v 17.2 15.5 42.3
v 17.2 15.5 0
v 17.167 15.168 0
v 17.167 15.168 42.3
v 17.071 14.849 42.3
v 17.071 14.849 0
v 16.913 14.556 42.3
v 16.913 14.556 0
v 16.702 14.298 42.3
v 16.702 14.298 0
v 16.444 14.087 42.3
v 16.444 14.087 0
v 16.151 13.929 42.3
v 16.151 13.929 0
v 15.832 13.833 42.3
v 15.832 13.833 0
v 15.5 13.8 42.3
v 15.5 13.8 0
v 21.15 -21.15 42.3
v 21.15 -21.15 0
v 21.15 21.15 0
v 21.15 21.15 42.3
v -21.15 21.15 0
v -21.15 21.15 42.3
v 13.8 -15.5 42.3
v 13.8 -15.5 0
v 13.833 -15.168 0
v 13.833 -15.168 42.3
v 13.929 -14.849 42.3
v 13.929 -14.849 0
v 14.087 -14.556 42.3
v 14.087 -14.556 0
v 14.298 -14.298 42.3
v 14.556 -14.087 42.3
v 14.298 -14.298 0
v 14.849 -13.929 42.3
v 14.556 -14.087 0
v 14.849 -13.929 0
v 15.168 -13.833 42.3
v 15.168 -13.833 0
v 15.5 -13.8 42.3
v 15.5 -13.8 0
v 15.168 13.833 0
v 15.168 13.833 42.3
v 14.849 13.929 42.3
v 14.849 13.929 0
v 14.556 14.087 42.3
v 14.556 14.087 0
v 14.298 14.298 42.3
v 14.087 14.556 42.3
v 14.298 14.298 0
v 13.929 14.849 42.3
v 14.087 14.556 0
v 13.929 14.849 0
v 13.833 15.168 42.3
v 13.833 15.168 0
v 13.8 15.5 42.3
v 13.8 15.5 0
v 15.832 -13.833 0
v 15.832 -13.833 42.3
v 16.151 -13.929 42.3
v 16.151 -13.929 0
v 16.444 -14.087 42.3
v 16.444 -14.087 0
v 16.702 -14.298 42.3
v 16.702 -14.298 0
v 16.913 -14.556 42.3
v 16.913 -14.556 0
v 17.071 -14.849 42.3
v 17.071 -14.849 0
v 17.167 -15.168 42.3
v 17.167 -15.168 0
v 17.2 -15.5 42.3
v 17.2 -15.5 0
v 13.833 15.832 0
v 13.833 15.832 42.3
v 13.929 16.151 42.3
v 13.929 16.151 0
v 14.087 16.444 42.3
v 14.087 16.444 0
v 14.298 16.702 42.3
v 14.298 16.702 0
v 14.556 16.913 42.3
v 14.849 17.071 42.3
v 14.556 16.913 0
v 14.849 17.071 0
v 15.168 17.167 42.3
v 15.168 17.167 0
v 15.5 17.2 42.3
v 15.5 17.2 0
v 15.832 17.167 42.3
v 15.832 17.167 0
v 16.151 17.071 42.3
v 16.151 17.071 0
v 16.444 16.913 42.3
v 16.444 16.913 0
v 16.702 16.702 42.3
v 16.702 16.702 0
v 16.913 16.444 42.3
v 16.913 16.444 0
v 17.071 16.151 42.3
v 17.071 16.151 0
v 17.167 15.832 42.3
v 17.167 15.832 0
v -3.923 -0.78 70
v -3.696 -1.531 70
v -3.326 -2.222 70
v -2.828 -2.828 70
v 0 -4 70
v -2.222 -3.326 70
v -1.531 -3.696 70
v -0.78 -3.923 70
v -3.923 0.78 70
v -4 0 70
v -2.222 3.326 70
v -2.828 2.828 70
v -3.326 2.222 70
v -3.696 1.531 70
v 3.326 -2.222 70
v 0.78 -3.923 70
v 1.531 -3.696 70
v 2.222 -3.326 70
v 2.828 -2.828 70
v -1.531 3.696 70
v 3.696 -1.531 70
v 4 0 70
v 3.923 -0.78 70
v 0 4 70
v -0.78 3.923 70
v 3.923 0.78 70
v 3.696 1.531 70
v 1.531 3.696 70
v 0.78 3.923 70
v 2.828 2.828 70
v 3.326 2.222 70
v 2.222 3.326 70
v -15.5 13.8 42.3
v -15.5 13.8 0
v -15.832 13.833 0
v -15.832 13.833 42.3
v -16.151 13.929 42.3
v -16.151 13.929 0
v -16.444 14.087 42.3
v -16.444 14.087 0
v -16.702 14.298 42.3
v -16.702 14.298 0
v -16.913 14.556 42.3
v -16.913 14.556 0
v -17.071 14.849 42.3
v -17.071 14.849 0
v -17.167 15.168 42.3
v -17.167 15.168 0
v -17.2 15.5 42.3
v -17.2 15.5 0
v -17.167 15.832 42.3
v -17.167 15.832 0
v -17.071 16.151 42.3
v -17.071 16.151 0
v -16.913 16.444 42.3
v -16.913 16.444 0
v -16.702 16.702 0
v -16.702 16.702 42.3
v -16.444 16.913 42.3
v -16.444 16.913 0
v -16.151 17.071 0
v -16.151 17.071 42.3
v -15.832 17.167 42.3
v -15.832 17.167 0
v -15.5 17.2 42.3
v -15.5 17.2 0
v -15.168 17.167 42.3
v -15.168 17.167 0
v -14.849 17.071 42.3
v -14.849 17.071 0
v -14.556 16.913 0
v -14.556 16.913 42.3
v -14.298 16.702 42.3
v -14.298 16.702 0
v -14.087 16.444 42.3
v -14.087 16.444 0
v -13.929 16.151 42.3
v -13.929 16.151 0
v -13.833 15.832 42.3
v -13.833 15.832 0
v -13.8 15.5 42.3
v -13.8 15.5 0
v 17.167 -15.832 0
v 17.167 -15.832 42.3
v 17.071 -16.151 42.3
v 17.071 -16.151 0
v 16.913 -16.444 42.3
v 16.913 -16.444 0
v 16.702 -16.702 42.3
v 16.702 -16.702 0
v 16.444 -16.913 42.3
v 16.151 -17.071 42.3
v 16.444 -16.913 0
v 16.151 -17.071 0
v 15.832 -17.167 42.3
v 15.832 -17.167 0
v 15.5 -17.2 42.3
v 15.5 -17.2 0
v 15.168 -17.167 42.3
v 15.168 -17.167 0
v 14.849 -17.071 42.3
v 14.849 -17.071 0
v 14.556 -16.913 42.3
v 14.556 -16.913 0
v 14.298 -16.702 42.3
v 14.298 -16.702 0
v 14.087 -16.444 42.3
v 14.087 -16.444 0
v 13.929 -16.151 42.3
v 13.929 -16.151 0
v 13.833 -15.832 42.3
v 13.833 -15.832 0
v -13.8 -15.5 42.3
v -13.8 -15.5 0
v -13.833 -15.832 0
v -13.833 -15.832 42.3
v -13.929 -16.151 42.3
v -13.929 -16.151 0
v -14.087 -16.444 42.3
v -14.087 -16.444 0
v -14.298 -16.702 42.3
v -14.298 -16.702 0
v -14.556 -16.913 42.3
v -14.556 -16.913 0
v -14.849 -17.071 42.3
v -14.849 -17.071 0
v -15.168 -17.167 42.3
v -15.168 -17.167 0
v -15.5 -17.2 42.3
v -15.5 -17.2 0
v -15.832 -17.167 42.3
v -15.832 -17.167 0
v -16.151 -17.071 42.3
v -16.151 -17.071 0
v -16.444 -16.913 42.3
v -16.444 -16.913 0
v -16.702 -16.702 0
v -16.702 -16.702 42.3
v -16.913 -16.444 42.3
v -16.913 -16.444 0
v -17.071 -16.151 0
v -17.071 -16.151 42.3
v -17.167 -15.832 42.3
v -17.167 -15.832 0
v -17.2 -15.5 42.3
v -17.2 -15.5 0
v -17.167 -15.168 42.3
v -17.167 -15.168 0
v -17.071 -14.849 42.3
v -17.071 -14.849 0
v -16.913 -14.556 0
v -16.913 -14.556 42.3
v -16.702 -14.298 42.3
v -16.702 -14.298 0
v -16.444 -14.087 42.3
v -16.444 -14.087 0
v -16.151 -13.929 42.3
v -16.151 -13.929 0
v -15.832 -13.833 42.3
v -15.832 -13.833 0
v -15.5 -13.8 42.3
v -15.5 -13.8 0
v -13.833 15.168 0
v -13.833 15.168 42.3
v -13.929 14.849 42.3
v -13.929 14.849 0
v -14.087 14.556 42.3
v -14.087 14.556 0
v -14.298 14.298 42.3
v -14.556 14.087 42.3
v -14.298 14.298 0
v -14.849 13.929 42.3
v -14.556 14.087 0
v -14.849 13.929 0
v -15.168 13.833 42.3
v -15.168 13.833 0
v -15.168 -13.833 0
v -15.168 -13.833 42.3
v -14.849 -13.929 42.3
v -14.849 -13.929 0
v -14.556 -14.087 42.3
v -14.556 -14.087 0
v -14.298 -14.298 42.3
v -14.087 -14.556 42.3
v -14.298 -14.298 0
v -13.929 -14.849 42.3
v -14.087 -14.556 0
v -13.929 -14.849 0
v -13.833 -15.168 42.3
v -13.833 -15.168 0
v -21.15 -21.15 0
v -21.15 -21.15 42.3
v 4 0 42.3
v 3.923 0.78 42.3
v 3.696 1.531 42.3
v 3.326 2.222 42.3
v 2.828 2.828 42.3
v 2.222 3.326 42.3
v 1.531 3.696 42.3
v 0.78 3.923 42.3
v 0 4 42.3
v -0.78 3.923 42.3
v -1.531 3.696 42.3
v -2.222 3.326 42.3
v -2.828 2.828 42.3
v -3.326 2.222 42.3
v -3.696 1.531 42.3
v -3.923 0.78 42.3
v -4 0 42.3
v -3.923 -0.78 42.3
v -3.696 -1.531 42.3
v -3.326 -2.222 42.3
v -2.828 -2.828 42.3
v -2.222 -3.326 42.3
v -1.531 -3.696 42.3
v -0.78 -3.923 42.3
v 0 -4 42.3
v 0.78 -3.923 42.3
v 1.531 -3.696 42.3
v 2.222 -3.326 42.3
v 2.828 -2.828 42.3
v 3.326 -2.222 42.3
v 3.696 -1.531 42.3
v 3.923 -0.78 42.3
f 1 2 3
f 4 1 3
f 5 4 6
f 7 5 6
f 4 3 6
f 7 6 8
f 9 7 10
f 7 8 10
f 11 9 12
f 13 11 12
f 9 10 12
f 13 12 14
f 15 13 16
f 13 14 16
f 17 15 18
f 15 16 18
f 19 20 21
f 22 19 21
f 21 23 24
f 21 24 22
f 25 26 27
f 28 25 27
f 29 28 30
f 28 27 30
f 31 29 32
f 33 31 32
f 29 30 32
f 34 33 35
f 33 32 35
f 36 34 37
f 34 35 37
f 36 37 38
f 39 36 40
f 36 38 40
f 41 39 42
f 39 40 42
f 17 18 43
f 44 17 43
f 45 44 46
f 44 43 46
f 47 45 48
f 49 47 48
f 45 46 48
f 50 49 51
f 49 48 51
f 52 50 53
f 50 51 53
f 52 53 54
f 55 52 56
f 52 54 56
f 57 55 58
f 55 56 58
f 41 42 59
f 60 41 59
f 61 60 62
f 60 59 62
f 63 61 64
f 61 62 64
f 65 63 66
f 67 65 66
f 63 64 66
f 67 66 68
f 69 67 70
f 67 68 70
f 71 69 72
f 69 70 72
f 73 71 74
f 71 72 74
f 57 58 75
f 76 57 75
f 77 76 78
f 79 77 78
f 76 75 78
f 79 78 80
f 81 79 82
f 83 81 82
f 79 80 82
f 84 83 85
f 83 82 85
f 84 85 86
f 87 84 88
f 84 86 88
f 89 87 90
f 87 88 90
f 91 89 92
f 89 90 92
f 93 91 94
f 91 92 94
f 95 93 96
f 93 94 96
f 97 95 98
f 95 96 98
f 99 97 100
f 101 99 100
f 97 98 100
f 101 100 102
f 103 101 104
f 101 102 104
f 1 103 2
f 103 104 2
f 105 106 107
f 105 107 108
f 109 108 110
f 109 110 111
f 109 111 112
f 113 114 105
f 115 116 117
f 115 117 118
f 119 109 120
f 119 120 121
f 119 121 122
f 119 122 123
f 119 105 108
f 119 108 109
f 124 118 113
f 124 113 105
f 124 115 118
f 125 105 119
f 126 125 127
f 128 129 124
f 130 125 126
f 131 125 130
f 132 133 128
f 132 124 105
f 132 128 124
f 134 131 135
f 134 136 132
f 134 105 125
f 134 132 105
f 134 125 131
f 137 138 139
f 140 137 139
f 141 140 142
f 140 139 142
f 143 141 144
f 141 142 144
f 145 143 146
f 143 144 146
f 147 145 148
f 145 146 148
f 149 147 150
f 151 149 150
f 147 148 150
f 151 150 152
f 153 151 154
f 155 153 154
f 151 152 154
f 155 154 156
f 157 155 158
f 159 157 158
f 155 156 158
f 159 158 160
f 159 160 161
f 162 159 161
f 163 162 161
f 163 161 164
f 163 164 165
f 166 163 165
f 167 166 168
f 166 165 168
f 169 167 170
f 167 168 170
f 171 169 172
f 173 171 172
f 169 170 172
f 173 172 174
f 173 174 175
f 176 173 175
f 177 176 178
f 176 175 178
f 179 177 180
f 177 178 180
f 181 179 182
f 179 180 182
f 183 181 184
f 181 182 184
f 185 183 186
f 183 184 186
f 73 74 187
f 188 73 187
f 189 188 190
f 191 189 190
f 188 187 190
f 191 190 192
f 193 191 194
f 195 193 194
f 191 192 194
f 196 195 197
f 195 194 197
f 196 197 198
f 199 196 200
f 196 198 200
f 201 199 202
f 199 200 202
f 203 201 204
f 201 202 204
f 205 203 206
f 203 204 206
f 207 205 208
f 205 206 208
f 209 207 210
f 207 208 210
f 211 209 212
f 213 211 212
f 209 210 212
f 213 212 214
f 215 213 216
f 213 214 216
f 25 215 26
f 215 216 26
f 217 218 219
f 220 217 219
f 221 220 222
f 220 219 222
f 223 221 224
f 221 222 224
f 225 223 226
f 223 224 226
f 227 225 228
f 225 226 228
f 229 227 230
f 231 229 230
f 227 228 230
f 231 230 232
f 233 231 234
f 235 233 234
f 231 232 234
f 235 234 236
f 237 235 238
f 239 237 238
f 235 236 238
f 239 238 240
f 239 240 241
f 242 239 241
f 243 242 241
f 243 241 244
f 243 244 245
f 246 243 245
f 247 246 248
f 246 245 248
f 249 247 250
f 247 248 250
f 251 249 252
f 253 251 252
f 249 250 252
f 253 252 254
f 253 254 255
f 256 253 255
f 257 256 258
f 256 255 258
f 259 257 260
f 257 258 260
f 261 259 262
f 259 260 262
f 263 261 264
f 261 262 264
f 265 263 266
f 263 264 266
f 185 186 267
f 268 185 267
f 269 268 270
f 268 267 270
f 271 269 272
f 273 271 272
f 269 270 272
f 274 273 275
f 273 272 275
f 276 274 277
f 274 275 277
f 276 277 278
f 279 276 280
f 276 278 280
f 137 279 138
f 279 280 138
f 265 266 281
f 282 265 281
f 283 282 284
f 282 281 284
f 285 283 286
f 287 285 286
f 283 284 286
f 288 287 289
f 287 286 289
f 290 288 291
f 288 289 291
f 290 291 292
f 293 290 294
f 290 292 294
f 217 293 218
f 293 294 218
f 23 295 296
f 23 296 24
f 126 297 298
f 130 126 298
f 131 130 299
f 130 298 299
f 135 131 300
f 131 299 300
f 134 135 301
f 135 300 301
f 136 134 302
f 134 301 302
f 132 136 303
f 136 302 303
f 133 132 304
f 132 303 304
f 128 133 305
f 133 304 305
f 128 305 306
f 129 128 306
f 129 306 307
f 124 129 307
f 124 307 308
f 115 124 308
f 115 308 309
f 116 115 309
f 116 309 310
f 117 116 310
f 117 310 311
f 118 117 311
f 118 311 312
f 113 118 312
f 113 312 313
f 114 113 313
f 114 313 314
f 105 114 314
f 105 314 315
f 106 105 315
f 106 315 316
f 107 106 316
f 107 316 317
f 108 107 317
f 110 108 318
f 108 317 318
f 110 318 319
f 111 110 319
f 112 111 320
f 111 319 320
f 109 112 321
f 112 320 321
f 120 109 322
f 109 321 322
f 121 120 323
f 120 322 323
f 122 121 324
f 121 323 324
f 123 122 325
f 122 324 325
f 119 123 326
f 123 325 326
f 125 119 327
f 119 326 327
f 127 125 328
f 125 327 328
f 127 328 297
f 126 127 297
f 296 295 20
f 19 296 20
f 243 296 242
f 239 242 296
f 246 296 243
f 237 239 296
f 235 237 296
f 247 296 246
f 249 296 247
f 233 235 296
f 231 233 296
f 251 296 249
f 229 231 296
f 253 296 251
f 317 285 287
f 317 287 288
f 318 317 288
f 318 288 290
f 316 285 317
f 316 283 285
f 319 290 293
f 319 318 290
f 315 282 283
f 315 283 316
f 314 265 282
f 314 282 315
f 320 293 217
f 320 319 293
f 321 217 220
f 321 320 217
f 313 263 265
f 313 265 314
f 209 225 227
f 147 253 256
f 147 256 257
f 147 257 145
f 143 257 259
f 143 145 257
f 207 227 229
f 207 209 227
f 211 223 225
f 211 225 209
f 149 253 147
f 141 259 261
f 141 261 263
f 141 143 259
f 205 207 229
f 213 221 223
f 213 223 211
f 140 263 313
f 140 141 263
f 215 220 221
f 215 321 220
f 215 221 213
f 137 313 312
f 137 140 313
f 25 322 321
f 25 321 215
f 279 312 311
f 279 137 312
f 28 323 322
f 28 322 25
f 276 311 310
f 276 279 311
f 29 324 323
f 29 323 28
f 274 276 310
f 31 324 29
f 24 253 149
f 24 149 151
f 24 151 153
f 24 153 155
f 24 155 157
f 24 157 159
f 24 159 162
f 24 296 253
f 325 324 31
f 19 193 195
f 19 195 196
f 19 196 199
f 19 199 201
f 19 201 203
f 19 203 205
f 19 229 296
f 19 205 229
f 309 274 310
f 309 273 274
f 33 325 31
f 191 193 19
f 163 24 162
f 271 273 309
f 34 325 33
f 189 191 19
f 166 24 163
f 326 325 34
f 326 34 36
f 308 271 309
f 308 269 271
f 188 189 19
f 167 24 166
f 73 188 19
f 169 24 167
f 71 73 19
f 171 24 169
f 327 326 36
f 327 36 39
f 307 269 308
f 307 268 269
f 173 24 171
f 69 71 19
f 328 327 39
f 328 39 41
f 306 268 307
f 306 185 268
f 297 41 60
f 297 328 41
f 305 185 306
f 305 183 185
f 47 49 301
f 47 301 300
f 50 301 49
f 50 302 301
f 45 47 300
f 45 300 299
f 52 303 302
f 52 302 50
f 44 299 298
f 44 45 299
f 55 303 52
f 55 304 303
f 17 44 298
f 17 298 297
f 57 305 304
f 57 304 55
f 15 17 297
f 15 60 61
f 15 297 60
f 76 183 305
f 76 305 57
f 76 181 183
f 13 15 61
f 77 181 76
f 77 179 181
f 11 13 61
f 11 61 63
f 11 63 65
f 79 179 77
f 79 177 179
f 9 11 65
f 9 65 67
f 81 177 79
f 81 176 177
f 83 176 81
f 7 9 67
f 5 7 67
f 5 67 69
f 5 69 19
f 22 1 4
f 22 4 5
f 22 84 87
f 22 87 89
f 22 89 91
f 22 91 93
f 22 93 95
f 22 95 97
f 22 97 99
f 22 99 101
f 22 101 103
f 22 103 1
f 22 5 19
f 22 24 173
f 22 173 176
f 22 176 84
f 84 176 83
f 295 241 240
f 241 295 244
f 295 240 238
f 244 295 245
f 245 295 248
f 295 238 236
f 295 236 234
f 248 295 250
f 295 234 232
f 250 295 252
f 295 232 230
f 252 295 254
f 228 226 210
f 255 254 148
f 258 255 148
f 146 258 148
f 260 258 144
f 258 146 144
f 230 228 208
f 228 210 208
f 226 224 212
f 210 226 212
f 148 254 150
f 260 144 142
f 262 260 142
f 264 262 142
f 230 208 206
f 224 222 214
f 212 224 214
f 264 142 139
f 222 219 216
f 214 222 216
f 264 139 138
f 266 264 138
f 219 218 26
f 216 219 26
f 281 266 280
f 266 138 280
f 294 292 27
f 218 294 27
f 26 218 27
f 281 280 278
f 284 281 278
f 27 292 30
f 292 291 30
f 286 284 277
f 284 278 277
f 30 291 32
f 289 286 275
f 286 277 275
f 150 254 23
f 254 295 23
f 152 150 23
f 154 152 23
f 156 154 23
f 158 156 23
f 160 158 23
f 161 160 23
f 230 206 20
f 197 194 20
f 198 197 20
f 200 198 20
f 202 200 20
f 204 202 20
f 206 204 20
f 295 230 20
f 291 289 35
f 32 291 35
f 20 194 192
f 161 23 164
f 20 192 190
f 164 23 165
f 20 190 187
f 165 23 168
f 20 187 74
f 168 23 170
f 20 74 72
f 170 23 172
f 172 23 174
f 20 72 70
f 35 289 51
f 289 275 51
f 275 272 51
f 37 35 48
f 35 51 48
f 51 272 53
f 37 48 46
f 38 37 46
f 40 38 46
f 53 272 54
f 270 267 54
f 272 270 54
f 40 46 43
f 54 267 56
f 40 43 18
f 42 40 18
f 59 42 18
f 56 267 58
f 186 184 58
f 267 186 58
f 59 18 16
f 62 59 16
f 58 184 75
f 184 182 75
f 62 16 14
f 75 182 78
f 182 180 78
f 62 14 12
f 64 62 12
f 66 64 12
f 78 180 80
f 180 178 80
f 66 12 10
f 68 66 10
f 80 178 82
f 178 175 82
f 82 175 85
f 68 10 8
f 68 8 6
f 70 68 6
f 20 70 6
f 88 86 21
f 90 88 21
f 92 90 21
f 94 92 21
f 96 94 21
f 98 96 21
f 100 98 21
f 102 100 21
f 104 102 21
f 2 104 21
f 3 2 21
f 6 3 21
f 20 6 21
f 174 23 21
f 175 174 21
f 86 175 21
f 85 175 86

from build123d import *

# Parameters (mm, degrees)
F0_W     = 42.3
F0_H     = 42.3
F0_R     = 4
F1_DEPTH = 42.3
F2_DEPTH = 70


with BuildPart() as f1:
    # F0 (on Top) → F1 (new body)
    with BuildSketch(Plane.XY):
        Rectangle(F0_W, F0_H)
        with BuildLine():
            ThreePointArc((-15.5, 13.8), (-16.702082, 16.702082), (-13.8, 15.5))
            Line((-13.8, 15.5), (13.8, 15.5))
            ThreePointArc((13.8, 15.5), (15.5, 17.2), (17.2, 15.5))
            ThreePointArc((17.2, 15.5), (16.702082, 14.297918), (15.5, 13.8))
            Line((15.5, 13.8), (15.5, -13.8))
            ThreePointArc((15.5, -13.8), (16.702082, -14.297918), (17.2, -15.5))
            ThreePointArc((17.2, -15.5), (15.5, -17.2), (13.8, -15.5))
            Line((13.8, -15.5), (-13.8, -15.5))
            ThreePointArc((-13.8, -15.5), (-16.702082, -16.702082), (-15.5, -13.8))
            Line((-15.5, -13.8), (-15.5, 13.8))
        make_face(mode=Mode.SUBTRACT)
        with BuildLine():
            Line((13.8, 15.5), (-13.8, 15.5))
            ThreePointArc((-13.8, 15.5), (-14.297918, 14.297918), (-15.5, 13.8))
            Line((-15.5, 13.8), (-15.5, -13.8))
            ThreePointArc((-15.5, -13.8), (-14.297918, -14.297918), (-13.8, -15.5))
            Line((-13.8, -15.5), (13.8, -15.5))
            ThreePointArc((13.8, -15.5), (14.297918, -14.297918), (15.5, -13.8))
            Line((15.5, -13.8), (15.5, 13.8))
            ThreePointArc((15.5, 13.8), (14.297918, 14.297918), (13.8, 15.5))
        make_face()
        Circle(F0_R, mode=Mode.SUBTRACT)
        Circle(F0_R)
    extrude(amount=F1_DEPTH)

    # F0 (on Top) → F2 (join)
    with BuildSketch(Plane.XY):
        Circle(F0_R)
    extrude(amount=F2_DEPTH)


solid = f1.part
